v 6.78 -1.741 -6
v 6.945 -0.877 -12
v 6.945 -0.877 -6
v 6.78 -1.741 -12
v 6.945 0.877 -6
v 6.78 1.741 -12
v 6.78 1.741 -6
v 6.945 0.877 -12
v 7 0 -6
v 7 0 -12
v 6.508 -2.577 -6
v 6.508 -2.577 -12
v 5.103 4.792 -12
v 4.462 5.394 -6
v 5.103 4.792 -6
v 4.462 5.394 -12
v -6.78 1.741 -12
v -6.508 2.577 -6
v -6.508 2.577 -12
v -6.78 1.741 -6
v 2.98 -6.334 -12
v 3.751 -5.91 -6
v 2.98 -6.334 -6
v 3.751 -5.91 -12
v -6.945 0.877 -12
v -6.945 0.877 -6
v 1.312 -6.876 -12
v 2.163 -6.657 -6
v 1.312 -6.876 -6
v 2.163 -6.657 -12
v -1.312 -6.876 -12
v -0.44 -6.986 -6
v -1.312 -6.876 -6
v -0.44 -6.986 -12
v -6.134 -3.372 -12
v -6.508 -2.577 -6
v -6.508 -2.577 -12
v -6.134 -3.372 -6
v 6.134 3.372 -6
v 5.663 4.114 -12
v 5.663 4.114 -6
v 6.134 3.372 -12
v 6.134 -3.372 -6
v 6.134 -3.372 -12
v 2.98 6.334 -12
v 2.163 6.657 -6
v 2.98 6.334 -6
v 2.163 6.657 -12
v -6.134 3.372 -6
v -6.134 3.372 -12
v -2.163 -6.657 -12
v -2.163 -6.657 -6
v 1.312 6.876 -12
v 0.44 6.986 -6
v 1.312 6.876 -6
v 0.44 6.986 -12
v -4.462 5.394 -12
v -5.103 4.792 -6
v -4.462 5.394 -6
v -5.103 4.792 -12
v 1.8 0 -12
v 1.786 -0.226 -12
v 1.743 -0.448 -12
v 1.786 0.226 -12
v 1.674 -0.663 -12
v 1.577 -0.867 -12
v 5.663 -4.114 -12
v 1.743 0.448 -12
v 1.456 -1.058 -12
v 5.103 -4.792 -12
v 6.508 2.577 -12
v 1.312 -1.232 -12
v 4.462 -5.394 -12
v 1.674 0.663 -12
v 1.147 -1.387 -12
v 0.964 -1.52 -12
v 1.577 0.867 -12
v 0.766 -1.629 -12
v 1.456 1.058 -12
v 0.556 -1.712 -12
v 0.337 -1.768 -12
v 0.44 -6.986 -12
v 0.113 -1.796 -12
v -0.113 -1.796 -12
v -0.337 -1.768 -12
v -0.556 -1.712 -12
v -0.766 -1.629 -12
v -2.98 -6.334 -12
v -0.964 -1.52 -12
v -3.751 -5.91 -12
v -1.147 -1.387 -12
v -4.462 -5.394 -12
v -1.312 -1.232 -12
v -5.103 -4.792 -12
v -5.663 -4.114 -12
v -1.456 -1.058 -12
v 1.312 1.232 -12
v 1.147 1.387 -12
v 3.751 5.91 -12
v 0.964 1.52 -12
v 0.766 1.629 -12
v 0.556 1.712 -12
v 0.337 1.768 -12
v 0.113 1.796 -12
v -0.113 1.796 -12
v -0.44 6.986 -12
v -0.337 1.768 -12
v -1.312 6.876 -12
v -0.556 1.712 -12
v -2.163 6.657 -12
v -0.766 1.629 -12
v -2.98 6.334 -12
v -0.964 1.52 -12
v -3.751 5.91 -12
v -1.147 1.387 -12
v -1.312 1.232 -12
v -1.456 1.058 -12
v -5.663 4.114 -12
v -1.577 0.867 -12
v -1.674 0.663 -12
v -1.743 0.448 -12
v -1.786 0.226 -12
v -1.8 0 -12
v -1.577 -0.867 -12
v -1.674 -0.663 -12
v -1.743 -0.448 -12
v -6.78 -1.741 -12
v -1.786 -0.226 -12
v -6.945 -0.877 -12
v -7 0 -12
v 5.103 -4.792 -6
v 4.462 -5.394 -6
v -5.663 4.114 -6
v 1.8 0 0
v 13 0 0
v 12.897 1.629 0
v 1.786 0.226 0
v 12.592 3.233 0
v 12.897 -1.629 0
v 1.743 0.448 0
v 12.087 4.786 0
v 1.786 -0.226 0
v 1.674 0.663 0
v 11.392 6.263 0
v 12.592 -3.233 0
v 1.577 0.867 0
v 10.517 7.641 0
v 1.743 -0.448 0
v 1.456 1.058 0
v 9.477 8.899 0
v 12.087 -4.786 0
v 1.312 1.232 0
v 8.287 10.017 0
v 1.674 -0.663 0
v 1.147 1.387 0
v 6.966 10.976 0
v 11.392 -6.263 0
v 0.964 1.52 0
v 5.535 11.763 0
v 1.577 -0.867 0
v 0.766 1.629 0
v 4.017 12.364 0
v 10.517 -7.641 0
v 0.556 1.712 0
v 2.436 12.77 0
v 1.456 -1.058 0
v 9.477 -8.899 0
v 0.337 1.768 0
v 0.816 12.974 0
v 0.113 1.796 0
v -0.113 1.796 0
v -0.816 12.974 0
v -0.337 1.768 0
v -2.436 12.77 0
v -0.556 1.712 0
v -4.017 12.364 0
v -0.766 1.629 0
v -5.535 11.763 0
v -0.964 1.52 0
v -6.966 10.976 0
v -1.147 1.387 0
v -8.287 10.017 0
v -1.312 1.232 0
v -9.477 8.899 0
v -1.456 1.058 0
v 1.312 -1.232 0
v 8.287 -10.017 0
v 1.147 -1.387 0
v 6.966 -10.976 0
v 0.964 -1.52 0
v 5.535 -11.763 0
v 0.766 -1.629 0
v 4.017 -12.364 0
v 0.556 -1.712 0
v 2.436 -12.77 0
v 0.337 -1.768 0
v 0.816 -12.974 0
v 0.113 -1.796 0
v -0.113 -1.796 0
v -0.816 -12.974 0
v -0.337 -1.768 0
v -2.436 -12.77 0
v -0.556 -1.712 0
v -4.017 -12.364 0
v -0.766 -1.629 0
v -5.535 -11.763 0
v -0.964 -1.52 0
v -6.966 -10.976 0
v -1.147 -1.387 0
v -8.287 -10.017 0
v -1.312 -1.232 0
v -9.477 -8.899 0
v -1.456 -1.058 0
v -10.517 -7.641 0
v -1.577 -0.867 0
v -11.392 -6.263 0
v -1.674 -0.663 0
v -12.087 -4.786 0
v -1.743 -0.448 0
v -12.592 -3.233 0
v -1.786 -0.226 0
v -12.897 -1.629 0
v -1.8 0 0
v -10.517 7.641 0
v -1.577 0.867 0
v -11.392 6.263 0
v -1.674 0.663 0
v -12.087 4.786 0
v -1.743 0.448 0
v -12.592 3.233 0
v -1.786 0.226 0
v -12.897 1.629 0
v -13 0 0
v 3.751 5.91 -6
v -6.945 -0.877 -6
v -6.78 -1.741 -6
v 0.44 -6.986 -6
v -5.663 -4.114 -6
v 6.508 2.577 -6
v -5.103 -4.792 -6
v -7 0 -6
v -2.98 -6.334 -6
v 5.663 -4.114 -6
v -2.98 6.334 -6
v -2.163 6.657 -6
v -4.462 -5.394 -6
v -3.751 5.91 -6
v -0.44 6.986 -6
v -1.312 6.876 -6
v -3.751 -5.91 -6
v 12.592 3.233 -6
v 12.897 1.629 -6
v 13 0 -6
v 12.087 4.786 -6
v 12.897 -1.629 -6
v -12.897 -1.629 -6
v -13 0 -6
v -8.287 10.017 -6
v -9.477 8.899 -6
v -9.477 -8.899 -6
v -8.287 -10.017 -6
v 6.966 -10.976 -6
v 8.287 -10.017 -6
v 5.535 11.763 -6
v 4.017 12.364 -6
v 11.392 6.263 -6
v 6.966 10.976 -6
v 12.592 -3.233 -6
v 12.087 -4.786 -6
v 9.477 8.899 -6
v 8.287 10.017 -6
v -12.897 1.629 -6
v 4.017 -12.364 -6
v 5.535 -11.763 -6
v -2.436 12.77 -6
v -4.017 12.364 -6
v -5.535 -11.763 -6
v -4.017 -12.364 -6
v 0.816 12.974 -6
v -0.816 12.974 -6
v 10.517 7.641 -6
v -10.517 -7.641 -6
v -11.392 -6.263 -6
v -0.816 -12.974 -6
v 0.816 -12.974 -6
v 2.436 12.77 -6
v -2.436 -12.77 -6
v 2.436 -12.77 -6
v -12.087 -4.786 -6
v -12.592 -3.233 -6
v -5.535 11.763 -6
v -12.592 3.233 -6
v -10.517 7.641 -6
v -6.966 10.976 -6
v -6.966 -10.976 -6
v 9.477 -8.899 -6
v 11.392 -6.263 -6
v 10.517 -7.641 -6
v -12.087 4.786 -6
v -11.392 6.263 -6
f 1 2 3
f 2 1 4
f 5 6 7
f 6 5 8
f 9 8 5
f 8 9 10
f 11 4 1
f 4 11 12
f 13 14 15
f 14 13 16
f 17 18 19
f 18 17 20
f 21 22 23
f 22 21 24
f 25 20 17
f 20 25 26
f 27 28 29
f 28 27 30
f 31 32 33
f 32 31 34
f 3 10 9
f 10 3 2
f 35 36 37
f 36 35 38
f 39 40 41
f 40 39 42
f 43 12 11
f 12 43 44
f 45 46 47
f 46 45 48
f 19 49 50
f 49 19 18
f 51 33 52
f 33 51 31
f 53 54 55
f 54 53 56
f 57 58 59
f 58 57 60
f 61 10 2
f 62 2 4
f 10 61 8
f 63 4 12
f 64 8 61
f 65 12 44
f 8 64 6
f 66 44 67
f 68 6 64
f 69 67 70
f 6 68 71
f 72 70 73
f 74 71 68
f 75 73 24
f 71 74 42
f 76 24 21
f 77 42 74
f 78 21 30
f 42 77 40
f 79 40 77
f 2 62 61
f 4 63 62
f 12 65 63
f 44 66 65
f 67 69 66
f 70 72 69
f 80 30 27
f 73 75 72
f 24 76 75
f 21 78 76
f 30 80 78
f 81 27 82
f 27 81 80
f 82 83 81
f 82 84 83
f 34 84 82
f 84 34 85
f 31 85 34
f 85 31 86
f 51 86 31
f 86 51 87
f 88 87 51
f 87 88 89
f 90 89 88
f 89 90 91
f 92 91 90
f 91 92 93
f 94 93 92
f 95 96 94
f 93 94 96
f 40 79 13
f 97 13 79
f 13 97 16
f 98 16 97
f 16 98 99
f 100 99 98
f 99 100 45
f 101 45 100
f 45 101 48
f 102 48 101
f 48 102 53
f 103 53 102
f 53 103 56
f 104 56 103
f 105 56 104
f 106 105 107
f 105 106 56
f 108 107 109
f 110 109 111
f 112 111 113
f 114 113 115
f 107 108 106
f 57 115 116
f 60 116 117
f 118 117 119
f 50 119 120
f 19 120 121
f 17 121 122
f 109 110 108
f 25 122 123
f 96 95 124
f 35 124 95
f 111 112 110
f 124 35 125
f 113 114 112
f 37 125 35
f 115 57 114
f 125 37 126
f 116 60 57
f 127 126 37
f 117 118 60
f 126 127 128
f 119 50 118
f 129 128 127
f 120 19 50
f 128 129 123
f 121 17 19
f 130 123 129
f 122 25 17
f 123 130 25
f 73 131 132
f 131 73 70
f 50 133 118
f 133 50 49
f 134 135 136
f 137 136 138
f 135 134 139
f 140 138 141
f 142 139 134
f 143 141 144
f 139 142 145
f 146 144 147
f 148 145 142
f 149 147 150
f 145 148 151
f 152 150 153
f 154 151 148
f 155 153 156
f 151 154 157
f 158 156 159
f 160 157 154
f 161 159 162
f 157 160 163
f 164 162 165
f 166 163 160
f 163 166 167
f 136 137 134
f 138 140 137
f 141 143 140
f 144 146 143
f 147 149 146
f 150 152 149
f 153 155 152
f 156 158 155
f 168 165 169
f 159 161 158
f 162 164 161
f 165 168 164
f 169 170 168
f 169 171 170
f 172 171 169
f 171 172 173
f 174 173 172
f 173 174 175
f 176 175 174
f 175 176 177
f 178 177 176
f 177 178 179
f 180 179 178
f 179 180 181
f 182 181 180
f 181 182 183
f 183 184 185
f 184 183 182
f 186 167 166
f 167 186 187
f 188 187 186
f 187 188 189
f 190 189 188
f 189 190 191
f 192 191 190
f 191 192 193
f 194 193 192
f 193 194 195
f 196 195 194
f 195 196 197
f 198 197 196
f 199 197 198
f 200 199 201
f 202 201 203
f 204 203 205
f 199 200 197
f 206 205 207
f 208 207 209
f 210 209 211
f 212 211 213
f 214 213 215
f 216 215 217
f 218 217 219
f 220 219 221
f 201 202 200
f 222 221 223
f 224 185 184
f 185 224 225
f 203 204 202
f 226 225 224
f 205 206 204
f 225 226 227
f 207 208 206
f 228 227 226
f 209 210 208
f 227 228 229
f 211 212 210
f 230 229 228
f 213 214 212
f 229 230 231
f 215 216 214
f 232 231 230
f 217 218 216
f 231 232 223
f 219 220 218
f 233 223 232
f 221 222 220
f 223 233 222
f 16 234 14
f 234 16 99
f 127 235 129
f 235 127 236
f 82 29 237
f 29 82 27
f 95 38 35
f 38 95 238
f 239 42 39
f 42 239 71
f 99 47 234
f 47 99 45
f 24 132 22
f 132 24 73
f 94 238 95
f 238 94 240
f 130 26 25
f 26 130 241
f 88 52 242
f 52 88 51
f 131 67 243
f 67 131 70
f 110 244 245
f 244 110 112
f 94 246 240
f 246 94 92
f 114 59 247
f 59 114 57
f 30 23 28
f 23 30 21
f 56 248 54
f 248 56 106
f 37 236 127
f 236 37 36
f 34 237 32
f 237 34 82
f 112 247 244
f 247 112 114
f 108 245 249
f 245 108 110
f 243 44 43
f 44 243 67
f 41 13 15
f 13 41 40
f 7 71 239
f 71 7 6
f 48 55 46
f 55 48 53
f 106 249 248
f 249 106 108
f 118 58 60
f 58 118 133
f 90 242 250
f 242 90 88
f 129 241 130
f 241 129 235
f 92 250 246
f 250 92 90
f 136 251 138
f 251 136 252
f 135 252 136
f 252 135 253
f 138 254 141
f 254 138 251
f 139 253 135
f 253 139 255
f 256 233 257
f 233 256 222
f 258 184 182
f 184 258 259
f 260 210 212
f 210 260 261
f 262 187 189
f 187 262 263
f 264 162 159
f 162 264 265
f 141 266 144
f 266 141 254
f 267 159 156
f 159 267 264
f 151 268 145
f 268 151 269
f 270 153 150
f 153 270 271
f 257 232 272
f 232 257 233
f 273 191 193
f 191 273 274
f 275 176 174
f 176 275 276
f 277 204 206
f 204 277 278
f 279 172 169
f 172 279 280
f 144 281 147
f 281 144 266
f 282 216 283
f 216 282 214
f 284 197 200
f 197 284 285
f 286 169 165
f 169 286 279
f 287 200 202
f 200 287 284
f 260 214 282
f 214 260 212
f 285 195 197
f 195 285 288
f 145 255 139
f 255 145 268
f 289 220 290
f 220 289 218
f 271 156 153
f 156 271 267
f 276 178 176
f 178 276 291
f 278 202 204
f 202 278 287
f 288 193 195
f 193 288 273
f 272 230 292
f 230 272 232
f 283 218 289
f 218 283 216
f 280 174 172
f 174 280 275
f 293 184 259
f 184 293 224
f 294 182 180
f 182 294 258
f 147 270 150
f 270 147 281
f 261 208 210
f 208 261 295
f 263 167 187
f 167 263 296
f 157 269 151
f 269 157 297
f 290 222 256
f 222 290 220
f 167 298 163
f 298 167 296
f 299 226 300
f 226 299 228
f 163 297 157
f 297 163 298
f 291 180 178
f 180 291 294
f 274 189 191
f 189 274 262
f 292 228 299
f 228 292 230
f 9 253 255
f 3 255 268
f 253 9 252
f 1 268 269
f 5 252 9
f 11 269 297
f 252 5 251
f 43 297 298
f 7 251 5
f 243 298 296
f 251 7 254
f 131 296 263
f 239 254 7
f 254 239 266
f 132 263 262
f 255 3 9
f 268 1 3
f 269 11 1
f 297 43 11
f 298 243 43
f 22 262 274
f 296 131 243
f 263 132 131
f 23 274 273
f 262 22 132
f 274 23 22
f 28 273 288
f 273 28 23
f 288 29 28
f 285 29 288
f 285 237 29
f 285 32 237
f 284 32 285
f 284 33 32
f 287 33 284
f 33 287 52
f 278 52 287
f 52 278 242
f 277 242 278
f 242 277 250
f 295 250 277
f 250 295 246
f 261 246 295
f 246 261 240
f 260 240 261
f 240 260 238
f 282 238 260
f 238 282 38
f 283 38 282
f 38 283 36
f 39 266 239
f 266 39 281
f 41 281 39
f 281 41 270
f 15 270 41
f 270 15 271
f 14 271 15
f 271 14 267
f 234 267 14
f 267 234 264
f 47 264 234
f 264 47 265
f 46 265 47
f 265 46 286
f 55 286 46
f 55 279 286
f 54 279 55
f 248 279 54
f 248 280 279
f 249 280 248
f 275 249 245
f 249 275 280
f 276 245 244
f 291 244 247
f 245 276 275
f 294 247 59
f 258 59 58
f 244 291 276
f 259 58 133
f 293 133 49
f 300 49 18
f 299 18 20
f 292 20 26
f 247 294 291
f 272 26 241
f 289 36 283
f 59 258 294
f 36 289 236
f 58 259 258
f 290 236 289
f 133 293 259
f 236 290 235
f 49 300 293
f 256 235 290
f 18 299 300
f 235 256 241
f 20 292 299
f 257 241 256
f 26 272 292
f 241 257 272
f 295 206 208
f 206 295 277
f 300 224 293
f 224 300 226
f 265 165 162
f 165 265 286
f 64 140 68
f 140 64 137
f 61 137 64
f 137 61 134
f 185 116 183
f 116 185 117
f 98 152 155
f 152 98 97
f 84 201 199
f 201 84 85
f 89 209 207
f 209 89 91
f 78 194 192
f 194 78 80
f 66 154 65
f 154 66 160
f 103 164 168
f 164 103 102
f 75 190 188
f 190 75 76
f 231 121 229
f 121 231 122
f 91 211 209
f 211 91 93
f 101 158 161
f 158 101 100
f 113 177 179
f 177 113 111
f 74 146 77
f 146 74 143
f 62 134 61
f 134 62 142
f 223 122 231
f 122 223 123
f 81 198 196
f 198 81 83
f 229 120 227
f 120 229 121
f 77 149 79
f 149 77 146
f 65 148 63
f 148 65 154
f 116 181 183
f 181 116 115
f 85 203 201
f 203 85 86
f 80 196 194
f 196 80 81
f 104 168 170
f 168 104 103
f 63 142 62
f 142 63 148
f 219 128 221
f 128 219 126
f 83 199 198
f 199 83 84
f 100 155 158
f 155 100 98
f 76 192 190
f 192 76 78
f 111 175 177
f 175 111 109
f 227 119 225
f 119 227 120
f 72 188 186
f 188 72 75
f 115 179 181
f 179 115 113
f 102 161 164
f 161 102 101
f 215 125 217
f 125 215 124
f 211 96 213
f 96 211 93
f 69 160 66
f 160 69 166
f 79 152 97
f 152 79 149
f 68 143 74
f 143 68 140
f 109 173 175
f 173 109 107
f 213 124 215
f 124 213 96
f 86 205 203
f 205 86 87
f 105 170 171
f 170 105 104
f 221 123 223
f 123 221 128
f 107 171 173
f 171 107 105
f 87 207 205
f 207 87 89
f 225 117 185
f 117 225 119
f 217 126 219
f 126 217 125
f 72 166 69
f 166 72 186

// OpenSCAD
$fn = 50;


difference() {
	union() {
		translate(v = [0, 0, -12.0000000000]) {
			cylinder(h = 12, r = 7.0000000000);
		}
		translate(v = [0, 0, -6.0000000000]) {
			cylinder(h = 6, r = 13.0000000000);
		}
	}
	union() {
		#translate(v = [0, 0, -12]) {
			cylinder(h = 12, r = 1.8000000000);
		}
	}
}
